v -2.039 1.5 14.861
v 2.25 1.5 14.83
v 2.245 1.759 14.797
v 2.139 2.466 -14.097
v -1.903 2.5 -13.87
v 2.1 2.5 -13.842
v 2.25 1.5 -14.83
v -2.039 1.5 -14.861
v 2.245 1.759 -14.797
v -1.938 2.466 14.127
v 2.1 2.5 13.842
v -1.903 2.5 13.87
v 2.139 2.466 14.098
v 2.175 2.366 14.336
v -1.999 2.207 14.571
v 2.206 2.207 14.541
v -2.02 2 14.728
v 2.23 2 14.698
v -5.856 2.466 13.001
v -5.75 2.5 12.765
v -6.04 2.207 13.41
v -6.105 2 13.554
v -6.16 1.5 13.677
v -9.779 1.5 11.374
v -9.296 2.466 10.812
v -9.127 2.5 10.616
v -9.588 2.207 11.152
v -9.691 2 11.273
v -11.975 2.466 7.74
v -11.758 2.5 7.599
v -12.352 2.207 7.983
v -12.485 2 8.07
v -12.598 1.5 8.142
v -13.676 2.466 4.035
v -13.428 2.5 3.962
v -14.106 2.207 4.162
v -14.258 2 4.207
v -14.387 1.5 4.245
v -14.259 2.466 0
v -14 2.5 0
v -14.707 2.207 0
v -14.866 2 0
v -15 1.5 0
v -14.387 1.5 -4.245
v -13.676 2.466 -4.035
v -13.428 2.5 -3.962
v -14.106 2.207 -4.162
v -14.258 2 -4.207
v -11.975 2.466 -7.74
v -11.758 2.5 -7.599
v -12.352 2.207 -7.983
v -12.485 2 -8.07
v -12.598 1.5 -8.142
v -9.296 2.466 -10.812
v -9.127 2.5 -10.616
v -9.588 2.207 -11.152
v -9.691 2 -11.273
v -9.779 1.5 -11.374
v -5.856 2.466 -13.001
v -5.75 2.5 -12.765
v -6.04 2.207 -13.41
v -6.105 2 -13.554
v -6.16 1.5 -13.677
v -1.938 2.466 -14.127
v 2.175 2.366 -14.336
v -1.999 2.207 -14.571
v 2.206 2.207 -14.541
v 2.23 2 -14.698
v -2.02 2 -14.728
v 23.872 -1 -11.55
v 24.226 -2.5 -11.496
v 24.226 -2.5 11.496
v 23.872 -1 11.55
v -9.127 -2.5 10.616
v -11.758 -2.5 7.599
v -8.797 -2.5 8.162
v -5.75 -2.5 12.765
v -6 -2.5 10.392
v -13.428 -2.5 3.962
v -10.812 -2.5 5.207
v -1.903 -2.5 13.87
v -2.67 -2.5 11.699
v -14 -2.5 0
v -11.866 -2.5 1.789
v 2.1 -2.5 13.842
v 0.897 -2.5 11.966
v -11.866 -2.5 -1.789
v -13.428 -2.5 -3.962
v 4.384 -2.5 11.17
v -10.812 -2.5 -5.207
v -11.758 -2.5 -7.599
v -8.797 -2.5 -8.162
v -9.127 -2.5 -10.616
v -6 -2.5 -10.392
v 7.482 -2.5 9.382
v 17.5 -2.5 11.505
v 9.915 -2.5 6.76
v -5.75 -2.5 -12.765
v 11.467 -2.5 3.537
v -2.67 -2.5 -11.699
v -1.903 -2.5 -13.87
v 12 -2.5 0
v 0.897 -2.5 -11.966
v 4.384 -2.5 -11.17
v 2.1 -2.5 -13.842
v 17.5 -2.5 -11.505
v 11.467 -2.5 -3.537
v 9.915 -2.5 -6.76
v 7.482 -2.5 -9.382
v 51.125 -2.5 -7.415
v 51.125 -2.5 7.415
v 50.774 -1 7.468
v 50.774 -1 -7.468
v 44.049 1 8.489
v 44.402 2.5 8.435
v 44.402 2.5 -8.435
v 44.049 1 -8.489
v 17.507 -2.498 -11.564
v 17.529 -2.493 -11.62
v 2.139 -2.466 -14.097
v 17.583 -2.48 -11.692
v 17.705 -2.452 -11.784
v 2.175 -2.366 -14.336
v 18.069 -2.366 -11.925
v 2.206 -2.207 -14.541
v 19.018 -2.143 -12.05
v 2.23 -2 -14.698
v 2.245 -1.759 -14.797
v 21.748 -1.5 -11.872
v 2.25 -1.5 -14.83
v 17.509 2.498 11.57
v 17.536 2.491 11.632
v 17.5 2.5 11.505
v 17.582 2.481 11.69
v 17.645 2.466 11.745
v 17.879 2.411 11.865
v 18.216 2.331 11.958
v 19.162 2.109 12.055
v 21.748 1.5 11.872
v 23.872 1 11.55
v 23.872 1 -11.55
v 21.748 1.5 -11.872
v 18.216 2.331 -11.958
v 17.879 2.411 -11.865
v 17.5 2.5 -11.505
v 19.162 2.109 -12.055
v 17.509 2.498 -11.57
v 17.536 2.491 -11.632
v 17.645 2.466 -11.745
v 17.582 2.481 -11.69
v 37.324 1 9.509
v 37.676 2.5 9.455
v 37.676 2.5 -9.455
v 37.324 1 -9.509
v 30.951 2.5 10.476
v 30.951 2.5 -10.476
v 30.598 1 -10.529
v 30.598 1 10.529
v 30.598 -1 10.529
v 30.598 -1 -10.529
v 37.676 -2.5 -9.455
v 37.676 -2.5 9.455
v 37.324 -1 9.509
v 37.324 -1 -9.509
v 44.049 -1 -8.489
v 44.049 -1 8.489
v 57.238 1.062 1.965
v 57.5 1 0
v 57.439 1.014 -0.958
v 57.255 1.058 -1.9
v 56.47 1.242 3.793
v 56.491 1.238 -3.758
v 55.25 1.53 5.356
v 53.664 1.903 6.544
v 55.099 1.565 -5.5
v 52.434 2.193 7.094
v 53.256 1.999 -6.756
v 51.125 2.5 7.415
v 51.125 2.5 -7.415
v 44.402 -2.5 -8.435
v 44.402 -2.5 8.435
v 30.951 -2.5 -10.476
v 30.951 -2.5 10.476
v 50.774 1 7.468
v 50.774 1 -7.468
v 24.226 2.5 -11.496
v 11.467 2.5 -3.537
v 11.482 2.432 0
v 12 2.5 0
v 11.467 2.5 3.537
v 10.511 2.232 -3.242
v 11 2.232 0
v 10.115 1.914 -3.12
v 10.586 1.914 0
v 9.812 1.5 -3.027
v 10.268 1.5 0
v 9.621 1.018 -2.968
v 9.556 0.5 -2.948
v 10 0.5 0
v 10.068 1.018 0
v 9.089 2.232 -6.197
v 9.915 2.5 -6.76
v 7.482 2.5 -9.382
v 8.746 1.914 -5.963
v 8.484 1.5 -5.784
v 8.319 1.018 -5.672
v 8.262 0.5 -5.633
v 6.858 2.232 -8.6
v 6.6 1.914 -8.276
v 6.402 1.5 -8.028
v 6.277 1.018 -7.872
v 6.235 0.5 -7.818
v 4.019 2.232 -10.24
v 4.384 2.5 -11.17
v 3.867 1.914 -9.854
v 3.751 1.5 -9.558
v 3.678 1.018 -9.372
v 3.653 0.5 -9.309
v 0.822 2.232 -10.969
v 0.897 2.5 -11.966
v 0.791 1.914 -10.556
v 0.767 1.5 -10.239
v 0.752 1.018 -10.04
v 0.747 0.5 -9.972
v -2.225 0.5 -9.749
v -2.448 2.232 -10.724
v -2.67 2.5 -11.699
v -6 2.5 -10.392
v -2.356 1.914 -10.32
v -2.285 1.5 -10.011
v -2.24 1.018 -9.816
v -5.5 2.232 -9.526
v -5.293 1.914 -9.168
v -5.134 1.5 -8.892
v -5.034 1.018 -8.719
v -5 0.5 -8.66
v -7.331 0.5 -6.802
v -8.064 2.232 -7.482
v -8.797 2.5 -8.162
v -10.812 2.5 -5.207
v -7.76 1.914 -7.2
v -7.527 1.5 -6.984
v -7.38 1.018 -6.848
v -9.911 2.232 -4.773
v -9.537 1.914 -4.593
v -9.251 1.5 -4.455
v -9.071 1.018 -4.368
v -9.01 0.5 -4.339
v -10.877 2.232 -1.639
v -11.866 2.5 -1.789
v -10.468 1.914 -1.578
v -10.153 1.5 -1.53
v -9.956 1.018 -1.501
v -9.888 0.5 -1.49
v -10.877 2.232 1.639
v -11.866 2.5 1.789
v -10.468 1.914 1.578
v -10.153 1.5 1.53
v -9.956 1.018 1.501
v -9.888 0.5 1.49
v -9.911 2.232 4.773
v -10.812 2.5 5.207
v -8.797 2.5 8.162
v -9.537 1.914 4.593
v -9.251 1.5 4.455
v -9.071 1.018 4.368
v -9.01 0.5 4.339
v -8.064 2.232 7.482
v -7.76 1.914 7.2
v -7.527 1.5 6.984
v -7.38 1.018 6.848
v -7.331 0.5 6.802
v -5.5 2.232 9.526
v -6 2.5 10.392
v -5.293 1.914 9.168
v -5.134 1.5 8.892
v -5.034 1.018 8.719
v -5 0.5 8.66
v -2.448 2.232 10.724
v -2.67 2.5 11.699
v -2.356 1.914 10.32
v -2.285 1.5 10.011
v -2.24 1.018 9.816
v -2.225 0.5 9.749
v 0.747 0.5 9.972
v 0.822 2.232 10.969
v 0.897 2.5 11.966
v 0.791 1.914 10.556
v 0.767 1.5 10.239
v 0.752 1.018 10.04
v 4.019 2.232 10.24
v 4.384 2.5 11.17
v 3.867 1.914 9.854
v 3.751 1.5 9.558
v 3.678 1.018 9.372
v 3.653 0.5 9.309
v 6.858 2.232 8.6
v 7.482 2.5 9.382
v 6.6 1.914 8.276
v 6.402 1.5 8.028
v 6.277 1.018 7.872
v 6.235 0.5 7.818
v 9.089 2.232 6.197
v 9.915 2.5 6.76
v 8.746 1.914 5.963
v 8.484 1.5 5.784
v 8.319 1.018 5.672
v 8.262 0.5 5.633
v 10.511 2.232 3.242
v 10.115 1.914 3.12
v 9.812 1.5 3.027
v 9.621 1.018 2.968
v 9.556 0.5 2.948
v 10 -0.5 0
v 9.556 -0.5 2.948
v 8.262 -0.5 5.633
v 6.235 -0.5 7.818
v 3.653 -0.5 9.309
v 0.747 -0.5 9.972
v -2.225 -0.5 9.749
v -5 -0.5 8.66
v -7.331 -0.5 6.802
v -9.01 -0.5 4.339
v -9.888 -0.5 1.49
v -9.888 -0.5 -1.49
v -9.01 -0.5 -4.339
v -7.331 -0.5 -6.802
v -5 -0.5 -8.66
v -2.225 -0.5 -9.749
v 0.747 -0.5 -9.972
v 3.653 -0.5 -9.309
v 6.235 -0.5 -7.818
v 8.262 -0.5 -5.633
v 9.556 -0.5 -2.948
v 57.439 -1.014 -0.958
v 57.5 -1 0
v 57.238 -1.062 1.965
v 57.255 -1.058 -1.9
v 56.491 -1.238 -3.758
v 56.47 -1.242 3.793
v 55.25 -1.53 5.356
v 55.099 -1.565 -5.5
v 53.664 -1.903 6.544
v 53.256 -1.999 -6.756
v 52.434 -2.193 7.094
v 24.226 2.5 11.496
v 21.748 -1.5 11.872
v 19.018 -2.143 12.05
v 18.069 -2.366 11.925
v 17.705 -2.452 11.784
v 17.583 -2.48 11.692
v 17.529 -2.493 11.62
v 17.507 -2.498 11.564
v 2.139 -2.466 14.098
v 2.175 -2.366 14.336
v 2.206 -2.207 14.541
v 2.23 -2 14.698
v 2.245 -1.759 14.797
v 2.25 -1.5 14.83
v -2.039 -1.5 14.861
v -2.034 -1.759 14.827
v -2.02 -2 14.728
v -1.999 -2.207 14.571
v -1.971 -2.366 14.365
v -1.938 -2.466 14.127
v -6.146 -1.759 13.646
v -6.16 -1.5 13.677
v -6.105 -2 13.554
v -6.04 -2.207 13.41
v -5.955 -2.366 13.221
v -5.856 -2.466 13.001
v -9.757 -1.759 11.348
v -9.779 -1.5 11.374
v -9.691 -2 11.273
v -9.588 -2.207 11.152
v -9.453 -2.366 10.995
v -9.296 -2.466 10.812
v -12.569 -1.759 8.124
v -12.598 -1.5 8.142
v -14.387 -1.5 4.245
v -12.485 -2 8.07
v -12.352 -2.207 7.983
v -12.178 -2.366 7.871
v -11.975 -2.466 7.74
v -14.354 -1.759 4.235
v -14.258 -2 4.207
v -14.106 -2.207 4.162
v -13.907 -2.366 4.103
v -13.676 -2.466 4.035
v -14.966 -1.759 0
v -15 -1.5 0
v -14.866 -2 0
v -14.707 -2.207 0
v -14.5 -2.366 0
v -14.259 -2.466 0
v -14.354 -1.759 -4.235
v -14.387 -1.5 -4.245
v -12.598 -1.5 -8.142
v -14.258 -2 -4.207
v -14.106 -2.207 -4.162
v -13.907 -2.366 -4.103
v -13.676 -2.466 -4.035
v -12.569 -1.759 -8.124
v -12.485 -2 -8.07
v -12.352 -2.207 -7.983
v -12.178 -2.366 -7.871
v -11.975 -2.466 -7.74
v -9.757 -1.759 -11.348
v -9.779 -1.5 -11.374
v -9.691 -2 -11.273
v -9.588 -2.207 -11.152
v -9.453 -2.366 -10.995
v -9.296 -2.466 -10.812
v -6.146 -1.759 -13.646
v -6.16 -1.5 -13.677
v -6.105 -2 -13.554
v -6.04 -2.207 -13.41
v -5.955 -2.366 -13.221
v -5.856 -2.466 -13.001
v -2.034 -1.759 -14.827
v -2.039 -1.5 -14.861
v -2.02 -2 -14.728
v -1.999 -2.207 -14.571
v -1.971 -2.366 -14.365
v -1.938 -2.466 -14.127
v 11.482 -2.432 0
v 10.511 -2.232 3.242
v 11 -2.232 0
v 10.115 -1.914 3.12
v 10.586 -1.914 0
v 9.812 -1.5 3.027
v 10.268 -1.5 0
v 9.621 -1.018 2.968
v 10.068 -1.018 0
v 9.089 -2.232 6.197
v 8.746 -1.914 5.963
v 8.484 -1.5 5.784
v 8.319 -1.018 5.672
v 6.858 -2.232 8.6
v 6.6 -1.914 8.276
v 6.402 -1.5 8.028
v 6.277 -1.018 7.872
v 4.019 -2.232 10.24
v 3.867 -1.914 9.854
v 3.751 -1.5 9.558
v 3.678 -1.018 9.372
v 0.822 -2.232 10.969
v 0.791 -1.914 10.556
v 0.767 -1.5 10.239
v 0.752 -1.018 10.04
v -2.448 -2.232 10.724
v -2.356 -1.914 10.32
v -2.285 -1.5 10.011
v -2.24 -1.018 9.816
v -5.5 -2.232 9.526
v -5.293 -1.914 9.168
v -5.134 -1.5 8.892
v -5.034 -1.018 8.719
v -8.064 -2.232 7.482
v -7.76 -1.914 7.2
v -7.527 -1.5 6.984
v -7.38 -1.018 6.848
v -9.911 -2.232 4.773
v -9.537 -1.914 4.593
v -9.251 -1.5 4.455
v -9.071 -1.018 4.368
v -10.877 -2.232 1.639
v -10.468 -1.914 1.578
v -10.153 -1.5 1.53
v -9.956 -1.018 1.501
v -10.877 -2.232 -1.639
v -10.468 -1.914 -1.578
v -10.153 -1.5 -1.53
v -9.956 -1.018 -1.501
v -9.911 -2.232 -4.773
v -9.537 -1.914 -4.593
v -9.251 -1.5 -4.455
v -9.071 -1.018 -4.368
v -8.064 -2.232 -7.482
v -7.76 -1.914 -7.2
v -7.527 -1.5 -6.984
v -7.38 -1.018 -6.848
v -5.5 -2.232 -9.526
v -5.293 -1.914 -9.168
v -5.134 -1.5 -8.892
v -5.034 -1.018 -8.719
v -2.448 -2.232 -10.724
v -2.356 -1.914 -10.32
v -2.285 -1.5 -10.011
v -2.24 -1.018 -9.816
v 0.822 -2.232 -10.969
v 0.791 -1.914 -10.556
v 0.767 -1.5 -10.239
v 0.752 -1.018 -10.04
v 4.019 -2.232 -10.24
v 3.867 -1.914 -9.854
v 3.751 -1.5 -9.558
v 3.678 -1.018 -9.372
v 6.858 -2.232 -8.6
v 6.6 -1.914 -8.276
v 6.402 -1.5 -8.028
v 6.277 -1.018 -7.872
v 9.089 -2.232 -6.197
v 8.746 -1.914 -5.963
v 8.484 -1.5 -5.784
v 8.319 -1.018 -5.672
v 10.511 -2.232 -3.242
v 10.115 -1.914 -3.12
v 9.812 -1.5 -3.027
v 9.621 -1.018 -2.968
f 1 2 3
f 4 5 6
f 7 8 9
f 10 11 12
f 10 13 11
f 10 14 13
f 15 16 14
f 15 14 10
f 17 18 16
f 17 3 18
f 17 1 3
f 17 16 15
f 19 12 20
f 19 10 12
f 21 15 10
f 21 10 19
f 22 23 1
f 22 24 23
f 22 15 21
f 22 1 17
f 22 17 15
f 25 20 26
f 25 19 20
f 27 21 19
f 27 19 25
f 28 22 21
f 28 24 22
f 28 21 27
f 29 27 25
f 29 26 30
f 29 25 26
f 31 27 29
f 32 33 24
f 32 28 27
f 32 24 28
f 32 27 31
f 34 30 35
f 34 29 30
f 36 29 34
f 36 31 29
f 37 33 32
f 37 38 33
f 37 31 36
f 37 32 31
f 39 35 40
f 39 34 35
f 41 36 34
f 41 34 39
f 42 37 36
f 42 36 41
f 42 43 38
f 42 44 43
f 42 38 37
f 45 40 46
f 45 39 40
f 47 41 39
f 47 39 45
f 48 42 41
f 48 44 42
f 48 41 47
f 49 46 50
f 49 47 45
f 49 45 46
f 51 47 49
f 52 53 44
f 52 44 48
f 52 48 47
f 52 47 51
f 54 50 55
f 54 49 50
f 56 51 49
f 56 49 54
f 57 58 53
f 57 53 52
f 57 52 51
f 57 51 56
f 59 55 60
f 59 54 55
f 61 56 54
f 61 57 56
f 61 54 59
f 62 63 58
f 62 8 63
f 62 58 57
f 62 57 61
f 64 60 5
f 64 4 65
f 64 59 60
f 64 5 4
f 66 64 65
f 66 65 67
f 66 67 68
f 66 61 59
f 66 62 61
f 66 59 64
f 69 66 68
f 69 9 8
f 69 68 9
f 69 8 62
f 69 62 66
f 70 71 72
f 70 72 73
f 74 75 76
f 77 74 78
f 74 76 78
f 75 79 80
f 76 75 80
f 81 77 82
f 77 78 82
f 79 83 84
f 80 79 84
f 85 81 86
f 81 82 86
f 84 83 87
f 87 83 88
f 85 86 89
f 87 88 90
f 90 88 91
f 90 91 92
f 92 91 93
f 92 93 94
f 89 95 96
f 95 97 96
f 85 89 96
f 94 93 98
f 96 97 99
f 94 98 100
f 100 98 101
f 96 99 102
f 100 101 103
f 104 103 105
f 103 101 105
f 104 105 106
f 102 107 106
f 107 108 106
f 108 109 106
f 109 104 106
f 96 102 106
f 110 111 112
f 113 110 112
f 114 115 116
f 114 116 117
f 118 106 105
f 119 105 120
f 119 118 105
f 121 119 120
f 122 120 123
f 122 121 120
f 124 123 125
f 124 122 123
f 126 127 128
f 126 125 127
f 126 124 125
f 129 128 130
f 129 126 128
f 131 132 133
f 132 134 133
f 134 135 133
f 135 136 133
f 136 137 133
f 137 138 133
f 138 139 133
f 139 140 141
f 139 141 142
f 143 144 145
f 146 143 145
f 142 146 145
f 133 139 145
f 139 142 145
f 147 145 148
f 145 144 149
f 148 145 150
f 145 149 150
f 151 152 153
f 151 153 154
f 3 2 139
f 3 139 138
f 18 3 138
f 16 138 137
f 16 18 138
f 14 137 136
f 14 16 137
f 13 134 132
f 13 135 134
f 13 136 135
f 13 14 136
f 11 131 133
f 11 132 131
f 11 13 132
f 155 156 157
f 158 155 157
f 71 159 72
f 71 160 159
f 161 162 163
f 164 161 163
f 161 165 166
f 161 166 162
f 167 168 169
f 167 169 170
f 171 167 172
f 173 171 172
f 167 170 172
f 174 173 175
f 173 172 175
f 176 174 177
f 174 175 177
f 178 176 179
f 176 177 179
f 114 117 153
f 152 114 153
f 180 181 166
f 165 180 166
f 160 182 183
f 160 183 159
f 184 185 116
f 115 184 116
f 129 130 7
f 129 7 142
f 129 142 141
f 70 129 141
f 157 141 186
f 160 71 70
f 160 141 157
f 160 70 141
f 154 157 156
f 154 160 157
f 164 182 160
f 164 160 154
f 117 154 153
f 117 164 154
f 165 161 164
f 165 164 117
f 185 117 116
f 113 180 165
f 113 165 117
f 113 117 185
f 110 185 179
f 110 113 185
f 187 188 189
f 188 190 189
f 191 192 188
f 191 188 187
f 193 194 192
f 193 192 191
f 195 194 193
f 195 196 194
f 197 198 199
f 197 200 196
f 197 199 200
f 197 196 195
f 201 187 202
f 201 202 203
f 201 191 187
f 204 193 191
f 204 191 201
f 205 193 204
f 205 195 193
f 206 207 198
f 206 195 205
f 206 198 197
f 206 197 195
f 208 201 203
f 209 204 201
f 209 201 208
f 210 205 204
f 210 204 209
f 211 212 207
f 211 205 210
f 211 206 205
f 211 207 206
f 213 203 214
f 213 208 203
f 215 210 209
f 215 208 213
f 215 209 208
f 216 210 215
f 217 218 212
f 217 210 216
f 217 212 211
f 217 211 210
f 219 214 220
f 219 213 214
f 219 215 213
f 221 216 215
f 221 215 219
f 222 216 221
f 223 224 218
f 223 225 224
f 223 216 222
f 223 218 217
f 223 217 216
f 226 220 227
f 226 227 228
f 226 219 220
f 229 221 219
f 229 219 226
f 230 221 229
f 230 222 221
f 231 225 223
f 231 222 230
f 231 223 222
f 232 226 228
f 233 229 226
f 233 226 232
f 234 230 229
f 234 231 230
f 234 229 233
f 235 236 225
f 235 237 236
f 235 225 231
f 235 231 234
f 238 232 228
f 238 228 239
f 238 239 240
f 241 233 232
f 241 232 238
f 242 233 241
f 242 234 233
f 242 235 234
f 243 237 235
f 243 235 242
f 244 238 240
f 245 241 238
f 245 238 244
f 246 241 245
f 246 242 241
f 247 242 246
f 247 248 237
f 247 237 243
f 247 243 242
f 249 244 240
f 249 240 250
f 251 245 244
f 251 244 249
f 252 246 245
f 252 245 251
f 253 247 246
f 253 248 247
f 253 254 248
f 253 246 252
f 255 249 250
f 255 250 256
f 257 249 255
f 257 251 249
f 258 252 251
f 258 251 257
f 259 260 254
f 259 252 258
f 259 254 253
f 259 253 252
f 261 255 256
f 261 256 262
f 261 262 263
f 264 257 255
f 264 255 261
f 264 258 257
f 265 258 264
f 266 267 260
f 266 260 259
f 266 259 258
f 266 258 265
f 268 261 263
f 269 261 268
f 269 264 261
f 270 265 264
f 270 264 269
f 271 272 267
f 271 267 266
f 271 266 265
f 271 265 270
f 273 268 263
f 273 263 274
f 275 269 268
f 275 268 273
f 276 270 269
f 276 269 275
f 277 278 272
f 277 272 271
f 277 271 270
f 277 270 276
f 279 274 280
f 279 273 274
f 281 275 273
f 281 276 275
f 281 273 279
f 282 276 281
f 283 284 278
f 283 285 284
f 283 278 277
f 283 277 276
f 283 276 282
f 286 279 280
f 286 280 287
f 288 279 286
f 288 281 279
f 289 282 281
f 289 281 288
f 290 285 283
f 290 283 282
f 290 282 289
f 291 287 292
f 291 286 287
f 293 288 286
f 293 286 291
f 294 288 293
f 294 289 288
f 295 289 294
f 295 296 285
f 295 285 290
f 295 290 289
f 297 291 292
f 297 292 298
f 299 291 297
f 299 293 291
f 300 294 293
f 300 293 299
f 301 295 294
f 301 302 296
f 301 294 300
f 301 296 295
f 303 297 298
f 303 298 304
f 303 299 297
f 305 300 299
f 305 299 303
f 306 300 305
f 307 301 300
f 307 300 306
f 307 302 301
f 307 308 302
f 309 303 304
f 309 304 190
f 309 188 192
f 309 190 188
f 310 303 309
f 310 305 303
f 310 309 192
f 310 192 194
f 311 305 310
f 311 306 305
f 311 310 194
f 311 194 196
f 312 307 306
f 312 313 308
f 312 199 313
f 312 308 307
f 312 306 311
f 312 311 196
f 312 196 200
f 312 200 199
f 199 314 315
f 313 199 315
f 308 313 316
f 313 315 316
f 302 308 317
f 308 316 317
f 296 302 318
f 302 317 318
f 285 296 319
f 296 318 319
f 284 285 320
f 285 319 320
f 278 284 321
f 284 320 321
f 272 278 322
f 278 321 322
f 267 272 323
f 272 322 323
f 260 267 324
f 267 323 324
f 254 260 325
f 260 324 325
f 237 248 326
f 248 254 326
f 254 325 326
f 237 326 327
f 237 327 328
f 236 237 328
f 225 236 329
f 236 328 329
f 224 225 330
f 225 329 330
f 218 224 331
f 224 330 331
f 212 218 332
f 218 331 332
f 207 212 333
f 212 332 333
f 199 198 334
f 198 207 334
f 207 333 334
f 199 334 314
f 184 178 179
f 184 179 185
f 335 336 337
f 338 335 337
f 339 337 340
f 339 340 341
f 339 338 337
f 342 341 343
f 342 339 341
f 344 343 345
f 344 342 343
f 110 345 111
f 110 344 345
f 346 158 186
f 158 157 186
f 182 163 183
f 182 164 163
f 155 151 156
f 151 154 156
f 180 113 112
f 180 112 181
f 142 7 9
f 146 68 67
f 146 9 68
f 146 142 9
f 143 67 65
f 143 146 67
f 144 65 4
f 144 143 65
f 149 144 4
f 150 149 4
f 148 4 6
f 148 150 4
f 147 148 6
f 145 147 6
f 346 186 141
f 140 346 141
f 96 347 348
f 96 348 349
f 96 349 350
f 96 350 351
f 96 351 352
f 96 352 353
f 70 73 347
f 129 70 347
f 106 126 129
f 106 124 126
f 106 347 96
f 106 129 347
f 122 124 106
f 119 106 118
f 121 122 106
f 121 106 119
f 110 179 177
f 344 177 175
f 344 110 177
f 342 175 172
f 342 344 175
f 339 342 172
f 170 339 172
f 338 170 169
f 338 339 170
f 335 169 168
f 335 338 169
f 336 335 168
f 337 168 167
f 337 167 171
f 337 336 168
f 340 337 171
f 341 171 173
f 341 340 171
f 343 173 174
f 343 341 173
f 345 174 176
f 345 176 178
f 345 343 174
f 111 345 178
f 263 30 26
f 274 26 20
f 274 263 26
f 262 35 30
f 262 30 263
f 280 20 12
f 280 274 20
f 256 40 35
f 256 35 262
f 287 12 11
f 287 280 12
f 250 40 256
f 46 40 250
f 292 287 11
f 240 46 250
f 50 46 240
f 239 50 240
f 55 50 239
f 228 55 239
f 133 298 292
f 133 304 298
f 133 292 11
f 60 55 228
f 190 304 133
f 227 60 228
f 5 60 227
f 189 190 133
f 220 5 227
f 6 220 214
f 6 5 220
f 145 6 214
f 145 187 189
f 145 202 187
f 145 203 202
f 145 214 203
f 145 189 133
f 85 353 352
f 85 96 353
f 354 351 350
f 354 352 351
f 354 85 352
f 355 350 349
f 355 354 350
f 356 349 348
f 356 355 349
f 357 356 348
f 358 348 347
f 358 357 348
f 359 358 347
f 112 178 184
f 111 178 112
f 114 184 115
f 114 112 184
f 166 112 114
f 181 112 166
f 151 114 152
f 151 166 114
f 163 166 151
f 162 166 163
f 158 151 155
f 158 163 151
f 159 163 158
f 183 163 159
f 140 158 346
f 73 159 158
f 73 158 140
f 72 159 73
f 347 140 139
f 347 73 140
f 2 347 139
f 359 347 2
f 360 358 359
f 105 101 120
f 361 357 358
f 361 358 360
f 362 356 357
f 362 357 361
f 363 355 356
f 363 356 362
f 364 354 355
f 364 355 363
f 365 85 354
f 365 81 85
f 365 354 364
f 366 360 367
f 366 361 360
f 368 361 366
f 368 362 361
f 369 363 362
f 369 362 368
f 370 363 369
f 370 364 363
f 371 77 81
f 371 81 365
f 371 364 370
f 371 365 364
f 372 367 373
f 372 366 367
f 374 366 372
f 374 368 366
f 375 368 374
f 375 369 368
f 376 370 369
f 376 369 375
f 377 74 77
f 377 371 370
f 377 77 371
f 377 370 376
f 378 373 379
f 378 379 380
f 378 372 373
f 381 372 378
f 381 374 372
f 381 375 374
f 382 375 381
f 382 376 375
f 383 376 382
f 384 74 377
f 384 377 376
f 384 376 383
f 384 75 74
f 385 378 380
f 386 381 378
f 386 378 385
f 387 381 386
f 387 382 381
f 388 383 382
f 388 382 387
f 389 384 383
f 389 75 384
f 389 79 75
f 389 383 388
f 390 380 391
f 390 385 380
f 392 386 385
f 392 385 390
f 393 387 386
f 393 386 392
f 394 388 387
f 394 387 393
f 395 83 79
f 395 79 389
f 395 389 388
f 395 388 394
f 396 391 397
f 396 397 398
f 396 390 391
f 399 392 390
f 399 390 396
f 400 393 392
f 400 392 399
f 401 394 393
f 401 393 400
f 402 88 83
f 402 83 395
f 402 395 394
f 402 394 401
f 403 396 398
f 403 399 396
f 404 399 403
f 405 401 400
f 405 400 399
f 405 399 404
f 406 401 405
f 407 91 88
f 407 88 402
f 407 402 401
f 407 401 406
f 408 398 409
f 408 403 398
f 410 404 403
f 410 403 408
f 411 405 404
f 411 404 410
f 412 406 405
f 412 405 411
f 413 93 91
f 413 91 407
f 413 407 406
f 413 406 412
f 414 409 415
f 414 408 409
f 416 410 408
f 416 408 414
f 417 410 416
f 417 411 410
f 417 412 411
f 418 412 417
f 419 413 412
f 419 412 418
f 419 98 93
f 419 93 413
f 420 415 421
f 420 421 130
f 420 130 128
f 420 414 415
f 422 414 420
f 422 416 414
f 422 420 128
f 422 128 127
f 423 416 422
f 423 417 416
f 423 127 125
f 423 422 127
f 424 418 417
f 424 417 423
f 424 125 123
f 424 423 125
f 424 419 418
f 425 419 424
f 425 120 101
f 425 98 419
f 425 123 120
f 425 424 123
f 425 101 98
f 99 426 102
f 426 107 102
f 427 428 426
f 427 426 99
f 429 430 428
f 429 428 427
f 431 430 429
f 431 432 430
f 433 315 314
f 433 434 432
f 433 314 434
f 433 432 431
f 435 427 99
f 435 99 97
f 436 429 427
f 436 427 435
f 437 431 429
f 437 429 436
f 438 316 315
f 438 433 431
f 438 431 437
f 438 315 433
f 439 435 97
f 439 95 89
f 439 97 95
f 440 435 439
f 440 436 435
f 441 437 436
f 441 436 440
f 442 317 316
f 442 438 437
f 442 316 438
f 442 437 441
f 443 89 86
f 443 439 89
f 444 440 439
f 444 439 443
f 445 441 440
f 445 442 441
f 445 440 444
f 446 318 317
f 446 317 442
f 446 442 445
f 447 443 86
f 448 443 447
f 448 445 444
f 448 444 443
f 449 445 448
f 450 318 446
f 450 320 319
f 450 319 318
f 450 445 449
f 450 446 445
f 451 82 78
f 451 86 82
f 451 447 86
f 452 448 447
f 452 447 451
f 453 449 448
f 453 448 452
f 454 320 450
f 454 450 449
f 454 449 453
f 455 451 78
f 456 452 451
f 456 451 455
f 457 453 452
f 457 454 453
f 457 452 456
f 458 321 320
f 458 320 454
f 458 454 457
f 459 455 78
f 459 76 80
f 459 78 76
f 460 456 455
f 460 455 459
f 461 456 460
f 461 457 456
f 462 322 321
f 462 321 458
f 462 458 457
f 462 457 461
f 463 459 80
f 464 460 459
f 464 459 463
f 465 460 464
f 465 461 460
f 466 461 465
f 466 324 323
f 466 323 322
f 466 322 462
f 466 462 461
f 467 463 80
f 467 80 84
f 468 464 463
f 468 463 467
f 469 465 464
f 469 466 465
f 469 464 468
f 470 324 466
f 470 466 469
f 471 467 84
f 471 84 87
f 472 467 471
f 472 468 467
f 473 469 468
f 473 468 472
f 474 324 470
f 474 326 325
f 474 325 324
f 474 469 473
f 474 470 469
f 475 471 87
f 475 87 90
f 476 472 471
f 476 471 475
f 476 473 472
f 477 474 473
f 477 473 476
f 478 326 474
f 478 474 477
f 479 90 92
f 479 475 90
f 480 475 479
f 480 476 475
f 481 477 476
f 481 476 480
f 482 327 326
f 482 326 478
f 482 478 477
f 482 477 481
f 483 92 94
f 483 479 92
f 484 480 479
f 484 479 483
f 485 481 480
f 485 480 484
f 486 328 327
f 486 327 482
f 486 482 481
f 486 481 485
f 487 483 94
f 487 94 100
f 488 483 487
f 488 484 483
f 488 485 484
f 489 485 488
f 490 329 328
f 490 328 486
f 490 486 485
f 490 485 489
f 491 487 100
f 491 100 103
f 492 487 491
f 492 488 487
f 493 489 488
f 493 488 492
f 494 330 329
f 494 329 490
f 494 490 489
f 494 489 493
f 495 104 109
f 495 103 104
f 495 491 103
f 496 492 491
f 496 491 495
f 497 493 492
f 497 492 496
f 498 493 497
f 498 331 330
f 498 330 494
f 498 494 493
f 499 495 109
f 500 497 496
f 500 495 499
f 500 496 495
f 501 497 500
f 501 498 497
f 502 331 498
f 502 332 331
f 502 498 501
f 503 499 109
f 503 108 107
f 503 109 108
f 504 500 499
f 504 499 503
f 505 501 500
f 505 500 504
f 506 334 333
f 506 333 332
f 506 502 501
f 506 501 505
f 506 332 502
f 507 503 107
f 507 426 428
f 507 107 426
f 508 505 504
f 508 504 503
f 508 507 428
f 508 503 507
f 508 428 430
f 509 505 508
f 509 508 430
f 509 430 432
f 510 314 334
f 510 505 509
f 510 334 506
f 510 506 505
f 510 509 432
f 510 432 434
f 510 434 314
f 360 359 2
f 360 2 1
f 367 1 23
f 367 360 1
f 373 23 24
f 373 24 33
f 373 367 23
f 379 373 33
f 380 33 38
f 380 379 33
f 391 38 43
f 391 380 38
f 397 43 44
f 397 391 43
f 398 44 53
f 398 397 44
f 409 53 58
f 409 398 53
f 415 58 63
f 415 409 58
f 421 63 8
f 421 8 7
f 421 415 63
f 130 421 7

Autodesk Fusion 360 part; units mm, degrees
sketch "Skizze1" plane through (0, 0, 0) normal (0, 1, 0) x (1, 0, 0)
  circle A0 centre (0, 0) radius 10
  circle A1 centre (0, 0) radius 15
  circle A2 centre (50, 0) radius 7.5
  line L0 (2.25, 14.8303) -> (51.125, 7.4151)
  line L1 (51.125, -7.4151) -> (2.25, -14.8303)
  dimension "d1" = 20
  dimension "d2" = 5
  dimension "d3" = 15
  dimension "d5" = 50
extrude "Extrusion1" add sketch "Skizze1" along normal mid plane 5
sketch "Skizze2" plane through (0, 0, 0) normal (0, 0, 1) x (1, 0, 0)
  line L0 (2.25, 2.5) -> (2.25, -2.5)
  line L1 (2.25, -2.5) -> (51.125, -2.5)
sketch "Skizze3" plane through (0, 0, 0) normal (0, 0, 1) x (1, 0, 0)
  line L0 (17.5, 2.5) -> (57.5, 2.5)
  line L1 (57.5, 2.5) -> (57.5, 1)
  line L2 (57.5, 1) -> (51.1276, 2.5)
  line L3 (51.1276, 2.5) -> (50.7745, 1)
  line L4 (50.7745, 1) -> (44.4021, 2.5)
  line L5 (44.4021, 2.5) -> (44.049, 1)
  line L6 (44.049, 1) -> (37.6765, 2.5)
  line L7 (37.6765, 2.5) -> (37.3235, 1)
  line L8 (37.3235, 1) -> (30.951, 2.5)
  line L9 (30.951, 2.5) -> (30.5979, 1)
  line L10 (30.5979, 1) -> (24.2255, 2.5)
  line L11 (24.2255, 2.5) -> (23.8724, 1)
  line L12 (23.8724, 1) -> (17.5, 2.5)
  line L13 (23.8724, 1) -> (57.5, 1) construction
  line L14 (24.2255, 2.5) -> (51.1276, 2.5) construction
  line L15 (51.125, -2.5) -> (51.125, 2.5)
  line L16 (2.25, 2.5) -> (51.125, 2.5)
  line L17 (1.75, 0) -> (22.5, 0)
  line L18 (44.049, -1) -> (37.6765, -2.5)
  line L19 (23.8724, -1) -> (17.5, -2.5)
  line L20 (17.5, -2.5) -> (57.5, -2.5)
  line L21 (24.2255, -2.5) -> (23.8724, -1)
  line L22 (30.951, -2.5) -> (30.5979, -1)
  line L23 (51.1276, -2.5) -> (50.7745, -1)
  line L24 (37.3235, -1) -> (30.951, -2.5)
  line L25 (23.8724, -1) -> (57.5, -1) construction
  line L26 (24.2255, -2.5) -> (51.1276, -2.5) construction
  line L27 (57.5, -2.5) -> (57.5, -1)
  line L28 (37.6765, -2.5) -> (37.3235, -1)
  line L29 (57.5, -1) -> (51.1276, -2.5)
  line L30 (50.7745, -1) -> (44.4021, -2.5)
  line L31 (44.4021, -2.5) -> (44.049, -1)
  line L32 (30.5979, -1) -> (24.2255, -2.5)
  line L33 (51.125, -2.5) -> (51.125, 2.5)
  line L34 (57.5, 2.5) -> (51.125, 2.5)
  line L35 (51.125, 2.5) -> (51.125, -2.5)
  line L36 (51.125, -2.5) -> (57.5, -2.5)
  point P0 (51.125, -2.5)
  dimension "d10" = 40
  dimension "d11" = 1.5
extrude "Extrusion2" cut sketch "Skizze3" along normal mid plane 30 contours L0 L1 L2 L34 | L20 L27 L29 L36 | L19 L20 L21 | L20 L22 L32 | L20 L24 L28 | L18 L20 L31 | L15 L20 L23 L30 L33 L35 | L0 L3 L4 L15 L16 L33 L35 | L0 L5 L6 L16 | L0 L7 L8 L16 | L0 L9 L10 L16 | L0 L11 L12 L16
fillet "Abrundung1" radius 2 2 edges at (-9.3233, 2.5, -3.6162) (-9.3233, -2.5, 3.6162)
fillet "Abrundung2" radius 1 6 edges at (9.875, 2.5, -13.6735) (-15, 2.5, 0) (9.875, 2.5, 13.6735) (9.875, -2.5, 13.6735) (-15, -2.5, 0) (9.875, -2.5, -13.6735)
